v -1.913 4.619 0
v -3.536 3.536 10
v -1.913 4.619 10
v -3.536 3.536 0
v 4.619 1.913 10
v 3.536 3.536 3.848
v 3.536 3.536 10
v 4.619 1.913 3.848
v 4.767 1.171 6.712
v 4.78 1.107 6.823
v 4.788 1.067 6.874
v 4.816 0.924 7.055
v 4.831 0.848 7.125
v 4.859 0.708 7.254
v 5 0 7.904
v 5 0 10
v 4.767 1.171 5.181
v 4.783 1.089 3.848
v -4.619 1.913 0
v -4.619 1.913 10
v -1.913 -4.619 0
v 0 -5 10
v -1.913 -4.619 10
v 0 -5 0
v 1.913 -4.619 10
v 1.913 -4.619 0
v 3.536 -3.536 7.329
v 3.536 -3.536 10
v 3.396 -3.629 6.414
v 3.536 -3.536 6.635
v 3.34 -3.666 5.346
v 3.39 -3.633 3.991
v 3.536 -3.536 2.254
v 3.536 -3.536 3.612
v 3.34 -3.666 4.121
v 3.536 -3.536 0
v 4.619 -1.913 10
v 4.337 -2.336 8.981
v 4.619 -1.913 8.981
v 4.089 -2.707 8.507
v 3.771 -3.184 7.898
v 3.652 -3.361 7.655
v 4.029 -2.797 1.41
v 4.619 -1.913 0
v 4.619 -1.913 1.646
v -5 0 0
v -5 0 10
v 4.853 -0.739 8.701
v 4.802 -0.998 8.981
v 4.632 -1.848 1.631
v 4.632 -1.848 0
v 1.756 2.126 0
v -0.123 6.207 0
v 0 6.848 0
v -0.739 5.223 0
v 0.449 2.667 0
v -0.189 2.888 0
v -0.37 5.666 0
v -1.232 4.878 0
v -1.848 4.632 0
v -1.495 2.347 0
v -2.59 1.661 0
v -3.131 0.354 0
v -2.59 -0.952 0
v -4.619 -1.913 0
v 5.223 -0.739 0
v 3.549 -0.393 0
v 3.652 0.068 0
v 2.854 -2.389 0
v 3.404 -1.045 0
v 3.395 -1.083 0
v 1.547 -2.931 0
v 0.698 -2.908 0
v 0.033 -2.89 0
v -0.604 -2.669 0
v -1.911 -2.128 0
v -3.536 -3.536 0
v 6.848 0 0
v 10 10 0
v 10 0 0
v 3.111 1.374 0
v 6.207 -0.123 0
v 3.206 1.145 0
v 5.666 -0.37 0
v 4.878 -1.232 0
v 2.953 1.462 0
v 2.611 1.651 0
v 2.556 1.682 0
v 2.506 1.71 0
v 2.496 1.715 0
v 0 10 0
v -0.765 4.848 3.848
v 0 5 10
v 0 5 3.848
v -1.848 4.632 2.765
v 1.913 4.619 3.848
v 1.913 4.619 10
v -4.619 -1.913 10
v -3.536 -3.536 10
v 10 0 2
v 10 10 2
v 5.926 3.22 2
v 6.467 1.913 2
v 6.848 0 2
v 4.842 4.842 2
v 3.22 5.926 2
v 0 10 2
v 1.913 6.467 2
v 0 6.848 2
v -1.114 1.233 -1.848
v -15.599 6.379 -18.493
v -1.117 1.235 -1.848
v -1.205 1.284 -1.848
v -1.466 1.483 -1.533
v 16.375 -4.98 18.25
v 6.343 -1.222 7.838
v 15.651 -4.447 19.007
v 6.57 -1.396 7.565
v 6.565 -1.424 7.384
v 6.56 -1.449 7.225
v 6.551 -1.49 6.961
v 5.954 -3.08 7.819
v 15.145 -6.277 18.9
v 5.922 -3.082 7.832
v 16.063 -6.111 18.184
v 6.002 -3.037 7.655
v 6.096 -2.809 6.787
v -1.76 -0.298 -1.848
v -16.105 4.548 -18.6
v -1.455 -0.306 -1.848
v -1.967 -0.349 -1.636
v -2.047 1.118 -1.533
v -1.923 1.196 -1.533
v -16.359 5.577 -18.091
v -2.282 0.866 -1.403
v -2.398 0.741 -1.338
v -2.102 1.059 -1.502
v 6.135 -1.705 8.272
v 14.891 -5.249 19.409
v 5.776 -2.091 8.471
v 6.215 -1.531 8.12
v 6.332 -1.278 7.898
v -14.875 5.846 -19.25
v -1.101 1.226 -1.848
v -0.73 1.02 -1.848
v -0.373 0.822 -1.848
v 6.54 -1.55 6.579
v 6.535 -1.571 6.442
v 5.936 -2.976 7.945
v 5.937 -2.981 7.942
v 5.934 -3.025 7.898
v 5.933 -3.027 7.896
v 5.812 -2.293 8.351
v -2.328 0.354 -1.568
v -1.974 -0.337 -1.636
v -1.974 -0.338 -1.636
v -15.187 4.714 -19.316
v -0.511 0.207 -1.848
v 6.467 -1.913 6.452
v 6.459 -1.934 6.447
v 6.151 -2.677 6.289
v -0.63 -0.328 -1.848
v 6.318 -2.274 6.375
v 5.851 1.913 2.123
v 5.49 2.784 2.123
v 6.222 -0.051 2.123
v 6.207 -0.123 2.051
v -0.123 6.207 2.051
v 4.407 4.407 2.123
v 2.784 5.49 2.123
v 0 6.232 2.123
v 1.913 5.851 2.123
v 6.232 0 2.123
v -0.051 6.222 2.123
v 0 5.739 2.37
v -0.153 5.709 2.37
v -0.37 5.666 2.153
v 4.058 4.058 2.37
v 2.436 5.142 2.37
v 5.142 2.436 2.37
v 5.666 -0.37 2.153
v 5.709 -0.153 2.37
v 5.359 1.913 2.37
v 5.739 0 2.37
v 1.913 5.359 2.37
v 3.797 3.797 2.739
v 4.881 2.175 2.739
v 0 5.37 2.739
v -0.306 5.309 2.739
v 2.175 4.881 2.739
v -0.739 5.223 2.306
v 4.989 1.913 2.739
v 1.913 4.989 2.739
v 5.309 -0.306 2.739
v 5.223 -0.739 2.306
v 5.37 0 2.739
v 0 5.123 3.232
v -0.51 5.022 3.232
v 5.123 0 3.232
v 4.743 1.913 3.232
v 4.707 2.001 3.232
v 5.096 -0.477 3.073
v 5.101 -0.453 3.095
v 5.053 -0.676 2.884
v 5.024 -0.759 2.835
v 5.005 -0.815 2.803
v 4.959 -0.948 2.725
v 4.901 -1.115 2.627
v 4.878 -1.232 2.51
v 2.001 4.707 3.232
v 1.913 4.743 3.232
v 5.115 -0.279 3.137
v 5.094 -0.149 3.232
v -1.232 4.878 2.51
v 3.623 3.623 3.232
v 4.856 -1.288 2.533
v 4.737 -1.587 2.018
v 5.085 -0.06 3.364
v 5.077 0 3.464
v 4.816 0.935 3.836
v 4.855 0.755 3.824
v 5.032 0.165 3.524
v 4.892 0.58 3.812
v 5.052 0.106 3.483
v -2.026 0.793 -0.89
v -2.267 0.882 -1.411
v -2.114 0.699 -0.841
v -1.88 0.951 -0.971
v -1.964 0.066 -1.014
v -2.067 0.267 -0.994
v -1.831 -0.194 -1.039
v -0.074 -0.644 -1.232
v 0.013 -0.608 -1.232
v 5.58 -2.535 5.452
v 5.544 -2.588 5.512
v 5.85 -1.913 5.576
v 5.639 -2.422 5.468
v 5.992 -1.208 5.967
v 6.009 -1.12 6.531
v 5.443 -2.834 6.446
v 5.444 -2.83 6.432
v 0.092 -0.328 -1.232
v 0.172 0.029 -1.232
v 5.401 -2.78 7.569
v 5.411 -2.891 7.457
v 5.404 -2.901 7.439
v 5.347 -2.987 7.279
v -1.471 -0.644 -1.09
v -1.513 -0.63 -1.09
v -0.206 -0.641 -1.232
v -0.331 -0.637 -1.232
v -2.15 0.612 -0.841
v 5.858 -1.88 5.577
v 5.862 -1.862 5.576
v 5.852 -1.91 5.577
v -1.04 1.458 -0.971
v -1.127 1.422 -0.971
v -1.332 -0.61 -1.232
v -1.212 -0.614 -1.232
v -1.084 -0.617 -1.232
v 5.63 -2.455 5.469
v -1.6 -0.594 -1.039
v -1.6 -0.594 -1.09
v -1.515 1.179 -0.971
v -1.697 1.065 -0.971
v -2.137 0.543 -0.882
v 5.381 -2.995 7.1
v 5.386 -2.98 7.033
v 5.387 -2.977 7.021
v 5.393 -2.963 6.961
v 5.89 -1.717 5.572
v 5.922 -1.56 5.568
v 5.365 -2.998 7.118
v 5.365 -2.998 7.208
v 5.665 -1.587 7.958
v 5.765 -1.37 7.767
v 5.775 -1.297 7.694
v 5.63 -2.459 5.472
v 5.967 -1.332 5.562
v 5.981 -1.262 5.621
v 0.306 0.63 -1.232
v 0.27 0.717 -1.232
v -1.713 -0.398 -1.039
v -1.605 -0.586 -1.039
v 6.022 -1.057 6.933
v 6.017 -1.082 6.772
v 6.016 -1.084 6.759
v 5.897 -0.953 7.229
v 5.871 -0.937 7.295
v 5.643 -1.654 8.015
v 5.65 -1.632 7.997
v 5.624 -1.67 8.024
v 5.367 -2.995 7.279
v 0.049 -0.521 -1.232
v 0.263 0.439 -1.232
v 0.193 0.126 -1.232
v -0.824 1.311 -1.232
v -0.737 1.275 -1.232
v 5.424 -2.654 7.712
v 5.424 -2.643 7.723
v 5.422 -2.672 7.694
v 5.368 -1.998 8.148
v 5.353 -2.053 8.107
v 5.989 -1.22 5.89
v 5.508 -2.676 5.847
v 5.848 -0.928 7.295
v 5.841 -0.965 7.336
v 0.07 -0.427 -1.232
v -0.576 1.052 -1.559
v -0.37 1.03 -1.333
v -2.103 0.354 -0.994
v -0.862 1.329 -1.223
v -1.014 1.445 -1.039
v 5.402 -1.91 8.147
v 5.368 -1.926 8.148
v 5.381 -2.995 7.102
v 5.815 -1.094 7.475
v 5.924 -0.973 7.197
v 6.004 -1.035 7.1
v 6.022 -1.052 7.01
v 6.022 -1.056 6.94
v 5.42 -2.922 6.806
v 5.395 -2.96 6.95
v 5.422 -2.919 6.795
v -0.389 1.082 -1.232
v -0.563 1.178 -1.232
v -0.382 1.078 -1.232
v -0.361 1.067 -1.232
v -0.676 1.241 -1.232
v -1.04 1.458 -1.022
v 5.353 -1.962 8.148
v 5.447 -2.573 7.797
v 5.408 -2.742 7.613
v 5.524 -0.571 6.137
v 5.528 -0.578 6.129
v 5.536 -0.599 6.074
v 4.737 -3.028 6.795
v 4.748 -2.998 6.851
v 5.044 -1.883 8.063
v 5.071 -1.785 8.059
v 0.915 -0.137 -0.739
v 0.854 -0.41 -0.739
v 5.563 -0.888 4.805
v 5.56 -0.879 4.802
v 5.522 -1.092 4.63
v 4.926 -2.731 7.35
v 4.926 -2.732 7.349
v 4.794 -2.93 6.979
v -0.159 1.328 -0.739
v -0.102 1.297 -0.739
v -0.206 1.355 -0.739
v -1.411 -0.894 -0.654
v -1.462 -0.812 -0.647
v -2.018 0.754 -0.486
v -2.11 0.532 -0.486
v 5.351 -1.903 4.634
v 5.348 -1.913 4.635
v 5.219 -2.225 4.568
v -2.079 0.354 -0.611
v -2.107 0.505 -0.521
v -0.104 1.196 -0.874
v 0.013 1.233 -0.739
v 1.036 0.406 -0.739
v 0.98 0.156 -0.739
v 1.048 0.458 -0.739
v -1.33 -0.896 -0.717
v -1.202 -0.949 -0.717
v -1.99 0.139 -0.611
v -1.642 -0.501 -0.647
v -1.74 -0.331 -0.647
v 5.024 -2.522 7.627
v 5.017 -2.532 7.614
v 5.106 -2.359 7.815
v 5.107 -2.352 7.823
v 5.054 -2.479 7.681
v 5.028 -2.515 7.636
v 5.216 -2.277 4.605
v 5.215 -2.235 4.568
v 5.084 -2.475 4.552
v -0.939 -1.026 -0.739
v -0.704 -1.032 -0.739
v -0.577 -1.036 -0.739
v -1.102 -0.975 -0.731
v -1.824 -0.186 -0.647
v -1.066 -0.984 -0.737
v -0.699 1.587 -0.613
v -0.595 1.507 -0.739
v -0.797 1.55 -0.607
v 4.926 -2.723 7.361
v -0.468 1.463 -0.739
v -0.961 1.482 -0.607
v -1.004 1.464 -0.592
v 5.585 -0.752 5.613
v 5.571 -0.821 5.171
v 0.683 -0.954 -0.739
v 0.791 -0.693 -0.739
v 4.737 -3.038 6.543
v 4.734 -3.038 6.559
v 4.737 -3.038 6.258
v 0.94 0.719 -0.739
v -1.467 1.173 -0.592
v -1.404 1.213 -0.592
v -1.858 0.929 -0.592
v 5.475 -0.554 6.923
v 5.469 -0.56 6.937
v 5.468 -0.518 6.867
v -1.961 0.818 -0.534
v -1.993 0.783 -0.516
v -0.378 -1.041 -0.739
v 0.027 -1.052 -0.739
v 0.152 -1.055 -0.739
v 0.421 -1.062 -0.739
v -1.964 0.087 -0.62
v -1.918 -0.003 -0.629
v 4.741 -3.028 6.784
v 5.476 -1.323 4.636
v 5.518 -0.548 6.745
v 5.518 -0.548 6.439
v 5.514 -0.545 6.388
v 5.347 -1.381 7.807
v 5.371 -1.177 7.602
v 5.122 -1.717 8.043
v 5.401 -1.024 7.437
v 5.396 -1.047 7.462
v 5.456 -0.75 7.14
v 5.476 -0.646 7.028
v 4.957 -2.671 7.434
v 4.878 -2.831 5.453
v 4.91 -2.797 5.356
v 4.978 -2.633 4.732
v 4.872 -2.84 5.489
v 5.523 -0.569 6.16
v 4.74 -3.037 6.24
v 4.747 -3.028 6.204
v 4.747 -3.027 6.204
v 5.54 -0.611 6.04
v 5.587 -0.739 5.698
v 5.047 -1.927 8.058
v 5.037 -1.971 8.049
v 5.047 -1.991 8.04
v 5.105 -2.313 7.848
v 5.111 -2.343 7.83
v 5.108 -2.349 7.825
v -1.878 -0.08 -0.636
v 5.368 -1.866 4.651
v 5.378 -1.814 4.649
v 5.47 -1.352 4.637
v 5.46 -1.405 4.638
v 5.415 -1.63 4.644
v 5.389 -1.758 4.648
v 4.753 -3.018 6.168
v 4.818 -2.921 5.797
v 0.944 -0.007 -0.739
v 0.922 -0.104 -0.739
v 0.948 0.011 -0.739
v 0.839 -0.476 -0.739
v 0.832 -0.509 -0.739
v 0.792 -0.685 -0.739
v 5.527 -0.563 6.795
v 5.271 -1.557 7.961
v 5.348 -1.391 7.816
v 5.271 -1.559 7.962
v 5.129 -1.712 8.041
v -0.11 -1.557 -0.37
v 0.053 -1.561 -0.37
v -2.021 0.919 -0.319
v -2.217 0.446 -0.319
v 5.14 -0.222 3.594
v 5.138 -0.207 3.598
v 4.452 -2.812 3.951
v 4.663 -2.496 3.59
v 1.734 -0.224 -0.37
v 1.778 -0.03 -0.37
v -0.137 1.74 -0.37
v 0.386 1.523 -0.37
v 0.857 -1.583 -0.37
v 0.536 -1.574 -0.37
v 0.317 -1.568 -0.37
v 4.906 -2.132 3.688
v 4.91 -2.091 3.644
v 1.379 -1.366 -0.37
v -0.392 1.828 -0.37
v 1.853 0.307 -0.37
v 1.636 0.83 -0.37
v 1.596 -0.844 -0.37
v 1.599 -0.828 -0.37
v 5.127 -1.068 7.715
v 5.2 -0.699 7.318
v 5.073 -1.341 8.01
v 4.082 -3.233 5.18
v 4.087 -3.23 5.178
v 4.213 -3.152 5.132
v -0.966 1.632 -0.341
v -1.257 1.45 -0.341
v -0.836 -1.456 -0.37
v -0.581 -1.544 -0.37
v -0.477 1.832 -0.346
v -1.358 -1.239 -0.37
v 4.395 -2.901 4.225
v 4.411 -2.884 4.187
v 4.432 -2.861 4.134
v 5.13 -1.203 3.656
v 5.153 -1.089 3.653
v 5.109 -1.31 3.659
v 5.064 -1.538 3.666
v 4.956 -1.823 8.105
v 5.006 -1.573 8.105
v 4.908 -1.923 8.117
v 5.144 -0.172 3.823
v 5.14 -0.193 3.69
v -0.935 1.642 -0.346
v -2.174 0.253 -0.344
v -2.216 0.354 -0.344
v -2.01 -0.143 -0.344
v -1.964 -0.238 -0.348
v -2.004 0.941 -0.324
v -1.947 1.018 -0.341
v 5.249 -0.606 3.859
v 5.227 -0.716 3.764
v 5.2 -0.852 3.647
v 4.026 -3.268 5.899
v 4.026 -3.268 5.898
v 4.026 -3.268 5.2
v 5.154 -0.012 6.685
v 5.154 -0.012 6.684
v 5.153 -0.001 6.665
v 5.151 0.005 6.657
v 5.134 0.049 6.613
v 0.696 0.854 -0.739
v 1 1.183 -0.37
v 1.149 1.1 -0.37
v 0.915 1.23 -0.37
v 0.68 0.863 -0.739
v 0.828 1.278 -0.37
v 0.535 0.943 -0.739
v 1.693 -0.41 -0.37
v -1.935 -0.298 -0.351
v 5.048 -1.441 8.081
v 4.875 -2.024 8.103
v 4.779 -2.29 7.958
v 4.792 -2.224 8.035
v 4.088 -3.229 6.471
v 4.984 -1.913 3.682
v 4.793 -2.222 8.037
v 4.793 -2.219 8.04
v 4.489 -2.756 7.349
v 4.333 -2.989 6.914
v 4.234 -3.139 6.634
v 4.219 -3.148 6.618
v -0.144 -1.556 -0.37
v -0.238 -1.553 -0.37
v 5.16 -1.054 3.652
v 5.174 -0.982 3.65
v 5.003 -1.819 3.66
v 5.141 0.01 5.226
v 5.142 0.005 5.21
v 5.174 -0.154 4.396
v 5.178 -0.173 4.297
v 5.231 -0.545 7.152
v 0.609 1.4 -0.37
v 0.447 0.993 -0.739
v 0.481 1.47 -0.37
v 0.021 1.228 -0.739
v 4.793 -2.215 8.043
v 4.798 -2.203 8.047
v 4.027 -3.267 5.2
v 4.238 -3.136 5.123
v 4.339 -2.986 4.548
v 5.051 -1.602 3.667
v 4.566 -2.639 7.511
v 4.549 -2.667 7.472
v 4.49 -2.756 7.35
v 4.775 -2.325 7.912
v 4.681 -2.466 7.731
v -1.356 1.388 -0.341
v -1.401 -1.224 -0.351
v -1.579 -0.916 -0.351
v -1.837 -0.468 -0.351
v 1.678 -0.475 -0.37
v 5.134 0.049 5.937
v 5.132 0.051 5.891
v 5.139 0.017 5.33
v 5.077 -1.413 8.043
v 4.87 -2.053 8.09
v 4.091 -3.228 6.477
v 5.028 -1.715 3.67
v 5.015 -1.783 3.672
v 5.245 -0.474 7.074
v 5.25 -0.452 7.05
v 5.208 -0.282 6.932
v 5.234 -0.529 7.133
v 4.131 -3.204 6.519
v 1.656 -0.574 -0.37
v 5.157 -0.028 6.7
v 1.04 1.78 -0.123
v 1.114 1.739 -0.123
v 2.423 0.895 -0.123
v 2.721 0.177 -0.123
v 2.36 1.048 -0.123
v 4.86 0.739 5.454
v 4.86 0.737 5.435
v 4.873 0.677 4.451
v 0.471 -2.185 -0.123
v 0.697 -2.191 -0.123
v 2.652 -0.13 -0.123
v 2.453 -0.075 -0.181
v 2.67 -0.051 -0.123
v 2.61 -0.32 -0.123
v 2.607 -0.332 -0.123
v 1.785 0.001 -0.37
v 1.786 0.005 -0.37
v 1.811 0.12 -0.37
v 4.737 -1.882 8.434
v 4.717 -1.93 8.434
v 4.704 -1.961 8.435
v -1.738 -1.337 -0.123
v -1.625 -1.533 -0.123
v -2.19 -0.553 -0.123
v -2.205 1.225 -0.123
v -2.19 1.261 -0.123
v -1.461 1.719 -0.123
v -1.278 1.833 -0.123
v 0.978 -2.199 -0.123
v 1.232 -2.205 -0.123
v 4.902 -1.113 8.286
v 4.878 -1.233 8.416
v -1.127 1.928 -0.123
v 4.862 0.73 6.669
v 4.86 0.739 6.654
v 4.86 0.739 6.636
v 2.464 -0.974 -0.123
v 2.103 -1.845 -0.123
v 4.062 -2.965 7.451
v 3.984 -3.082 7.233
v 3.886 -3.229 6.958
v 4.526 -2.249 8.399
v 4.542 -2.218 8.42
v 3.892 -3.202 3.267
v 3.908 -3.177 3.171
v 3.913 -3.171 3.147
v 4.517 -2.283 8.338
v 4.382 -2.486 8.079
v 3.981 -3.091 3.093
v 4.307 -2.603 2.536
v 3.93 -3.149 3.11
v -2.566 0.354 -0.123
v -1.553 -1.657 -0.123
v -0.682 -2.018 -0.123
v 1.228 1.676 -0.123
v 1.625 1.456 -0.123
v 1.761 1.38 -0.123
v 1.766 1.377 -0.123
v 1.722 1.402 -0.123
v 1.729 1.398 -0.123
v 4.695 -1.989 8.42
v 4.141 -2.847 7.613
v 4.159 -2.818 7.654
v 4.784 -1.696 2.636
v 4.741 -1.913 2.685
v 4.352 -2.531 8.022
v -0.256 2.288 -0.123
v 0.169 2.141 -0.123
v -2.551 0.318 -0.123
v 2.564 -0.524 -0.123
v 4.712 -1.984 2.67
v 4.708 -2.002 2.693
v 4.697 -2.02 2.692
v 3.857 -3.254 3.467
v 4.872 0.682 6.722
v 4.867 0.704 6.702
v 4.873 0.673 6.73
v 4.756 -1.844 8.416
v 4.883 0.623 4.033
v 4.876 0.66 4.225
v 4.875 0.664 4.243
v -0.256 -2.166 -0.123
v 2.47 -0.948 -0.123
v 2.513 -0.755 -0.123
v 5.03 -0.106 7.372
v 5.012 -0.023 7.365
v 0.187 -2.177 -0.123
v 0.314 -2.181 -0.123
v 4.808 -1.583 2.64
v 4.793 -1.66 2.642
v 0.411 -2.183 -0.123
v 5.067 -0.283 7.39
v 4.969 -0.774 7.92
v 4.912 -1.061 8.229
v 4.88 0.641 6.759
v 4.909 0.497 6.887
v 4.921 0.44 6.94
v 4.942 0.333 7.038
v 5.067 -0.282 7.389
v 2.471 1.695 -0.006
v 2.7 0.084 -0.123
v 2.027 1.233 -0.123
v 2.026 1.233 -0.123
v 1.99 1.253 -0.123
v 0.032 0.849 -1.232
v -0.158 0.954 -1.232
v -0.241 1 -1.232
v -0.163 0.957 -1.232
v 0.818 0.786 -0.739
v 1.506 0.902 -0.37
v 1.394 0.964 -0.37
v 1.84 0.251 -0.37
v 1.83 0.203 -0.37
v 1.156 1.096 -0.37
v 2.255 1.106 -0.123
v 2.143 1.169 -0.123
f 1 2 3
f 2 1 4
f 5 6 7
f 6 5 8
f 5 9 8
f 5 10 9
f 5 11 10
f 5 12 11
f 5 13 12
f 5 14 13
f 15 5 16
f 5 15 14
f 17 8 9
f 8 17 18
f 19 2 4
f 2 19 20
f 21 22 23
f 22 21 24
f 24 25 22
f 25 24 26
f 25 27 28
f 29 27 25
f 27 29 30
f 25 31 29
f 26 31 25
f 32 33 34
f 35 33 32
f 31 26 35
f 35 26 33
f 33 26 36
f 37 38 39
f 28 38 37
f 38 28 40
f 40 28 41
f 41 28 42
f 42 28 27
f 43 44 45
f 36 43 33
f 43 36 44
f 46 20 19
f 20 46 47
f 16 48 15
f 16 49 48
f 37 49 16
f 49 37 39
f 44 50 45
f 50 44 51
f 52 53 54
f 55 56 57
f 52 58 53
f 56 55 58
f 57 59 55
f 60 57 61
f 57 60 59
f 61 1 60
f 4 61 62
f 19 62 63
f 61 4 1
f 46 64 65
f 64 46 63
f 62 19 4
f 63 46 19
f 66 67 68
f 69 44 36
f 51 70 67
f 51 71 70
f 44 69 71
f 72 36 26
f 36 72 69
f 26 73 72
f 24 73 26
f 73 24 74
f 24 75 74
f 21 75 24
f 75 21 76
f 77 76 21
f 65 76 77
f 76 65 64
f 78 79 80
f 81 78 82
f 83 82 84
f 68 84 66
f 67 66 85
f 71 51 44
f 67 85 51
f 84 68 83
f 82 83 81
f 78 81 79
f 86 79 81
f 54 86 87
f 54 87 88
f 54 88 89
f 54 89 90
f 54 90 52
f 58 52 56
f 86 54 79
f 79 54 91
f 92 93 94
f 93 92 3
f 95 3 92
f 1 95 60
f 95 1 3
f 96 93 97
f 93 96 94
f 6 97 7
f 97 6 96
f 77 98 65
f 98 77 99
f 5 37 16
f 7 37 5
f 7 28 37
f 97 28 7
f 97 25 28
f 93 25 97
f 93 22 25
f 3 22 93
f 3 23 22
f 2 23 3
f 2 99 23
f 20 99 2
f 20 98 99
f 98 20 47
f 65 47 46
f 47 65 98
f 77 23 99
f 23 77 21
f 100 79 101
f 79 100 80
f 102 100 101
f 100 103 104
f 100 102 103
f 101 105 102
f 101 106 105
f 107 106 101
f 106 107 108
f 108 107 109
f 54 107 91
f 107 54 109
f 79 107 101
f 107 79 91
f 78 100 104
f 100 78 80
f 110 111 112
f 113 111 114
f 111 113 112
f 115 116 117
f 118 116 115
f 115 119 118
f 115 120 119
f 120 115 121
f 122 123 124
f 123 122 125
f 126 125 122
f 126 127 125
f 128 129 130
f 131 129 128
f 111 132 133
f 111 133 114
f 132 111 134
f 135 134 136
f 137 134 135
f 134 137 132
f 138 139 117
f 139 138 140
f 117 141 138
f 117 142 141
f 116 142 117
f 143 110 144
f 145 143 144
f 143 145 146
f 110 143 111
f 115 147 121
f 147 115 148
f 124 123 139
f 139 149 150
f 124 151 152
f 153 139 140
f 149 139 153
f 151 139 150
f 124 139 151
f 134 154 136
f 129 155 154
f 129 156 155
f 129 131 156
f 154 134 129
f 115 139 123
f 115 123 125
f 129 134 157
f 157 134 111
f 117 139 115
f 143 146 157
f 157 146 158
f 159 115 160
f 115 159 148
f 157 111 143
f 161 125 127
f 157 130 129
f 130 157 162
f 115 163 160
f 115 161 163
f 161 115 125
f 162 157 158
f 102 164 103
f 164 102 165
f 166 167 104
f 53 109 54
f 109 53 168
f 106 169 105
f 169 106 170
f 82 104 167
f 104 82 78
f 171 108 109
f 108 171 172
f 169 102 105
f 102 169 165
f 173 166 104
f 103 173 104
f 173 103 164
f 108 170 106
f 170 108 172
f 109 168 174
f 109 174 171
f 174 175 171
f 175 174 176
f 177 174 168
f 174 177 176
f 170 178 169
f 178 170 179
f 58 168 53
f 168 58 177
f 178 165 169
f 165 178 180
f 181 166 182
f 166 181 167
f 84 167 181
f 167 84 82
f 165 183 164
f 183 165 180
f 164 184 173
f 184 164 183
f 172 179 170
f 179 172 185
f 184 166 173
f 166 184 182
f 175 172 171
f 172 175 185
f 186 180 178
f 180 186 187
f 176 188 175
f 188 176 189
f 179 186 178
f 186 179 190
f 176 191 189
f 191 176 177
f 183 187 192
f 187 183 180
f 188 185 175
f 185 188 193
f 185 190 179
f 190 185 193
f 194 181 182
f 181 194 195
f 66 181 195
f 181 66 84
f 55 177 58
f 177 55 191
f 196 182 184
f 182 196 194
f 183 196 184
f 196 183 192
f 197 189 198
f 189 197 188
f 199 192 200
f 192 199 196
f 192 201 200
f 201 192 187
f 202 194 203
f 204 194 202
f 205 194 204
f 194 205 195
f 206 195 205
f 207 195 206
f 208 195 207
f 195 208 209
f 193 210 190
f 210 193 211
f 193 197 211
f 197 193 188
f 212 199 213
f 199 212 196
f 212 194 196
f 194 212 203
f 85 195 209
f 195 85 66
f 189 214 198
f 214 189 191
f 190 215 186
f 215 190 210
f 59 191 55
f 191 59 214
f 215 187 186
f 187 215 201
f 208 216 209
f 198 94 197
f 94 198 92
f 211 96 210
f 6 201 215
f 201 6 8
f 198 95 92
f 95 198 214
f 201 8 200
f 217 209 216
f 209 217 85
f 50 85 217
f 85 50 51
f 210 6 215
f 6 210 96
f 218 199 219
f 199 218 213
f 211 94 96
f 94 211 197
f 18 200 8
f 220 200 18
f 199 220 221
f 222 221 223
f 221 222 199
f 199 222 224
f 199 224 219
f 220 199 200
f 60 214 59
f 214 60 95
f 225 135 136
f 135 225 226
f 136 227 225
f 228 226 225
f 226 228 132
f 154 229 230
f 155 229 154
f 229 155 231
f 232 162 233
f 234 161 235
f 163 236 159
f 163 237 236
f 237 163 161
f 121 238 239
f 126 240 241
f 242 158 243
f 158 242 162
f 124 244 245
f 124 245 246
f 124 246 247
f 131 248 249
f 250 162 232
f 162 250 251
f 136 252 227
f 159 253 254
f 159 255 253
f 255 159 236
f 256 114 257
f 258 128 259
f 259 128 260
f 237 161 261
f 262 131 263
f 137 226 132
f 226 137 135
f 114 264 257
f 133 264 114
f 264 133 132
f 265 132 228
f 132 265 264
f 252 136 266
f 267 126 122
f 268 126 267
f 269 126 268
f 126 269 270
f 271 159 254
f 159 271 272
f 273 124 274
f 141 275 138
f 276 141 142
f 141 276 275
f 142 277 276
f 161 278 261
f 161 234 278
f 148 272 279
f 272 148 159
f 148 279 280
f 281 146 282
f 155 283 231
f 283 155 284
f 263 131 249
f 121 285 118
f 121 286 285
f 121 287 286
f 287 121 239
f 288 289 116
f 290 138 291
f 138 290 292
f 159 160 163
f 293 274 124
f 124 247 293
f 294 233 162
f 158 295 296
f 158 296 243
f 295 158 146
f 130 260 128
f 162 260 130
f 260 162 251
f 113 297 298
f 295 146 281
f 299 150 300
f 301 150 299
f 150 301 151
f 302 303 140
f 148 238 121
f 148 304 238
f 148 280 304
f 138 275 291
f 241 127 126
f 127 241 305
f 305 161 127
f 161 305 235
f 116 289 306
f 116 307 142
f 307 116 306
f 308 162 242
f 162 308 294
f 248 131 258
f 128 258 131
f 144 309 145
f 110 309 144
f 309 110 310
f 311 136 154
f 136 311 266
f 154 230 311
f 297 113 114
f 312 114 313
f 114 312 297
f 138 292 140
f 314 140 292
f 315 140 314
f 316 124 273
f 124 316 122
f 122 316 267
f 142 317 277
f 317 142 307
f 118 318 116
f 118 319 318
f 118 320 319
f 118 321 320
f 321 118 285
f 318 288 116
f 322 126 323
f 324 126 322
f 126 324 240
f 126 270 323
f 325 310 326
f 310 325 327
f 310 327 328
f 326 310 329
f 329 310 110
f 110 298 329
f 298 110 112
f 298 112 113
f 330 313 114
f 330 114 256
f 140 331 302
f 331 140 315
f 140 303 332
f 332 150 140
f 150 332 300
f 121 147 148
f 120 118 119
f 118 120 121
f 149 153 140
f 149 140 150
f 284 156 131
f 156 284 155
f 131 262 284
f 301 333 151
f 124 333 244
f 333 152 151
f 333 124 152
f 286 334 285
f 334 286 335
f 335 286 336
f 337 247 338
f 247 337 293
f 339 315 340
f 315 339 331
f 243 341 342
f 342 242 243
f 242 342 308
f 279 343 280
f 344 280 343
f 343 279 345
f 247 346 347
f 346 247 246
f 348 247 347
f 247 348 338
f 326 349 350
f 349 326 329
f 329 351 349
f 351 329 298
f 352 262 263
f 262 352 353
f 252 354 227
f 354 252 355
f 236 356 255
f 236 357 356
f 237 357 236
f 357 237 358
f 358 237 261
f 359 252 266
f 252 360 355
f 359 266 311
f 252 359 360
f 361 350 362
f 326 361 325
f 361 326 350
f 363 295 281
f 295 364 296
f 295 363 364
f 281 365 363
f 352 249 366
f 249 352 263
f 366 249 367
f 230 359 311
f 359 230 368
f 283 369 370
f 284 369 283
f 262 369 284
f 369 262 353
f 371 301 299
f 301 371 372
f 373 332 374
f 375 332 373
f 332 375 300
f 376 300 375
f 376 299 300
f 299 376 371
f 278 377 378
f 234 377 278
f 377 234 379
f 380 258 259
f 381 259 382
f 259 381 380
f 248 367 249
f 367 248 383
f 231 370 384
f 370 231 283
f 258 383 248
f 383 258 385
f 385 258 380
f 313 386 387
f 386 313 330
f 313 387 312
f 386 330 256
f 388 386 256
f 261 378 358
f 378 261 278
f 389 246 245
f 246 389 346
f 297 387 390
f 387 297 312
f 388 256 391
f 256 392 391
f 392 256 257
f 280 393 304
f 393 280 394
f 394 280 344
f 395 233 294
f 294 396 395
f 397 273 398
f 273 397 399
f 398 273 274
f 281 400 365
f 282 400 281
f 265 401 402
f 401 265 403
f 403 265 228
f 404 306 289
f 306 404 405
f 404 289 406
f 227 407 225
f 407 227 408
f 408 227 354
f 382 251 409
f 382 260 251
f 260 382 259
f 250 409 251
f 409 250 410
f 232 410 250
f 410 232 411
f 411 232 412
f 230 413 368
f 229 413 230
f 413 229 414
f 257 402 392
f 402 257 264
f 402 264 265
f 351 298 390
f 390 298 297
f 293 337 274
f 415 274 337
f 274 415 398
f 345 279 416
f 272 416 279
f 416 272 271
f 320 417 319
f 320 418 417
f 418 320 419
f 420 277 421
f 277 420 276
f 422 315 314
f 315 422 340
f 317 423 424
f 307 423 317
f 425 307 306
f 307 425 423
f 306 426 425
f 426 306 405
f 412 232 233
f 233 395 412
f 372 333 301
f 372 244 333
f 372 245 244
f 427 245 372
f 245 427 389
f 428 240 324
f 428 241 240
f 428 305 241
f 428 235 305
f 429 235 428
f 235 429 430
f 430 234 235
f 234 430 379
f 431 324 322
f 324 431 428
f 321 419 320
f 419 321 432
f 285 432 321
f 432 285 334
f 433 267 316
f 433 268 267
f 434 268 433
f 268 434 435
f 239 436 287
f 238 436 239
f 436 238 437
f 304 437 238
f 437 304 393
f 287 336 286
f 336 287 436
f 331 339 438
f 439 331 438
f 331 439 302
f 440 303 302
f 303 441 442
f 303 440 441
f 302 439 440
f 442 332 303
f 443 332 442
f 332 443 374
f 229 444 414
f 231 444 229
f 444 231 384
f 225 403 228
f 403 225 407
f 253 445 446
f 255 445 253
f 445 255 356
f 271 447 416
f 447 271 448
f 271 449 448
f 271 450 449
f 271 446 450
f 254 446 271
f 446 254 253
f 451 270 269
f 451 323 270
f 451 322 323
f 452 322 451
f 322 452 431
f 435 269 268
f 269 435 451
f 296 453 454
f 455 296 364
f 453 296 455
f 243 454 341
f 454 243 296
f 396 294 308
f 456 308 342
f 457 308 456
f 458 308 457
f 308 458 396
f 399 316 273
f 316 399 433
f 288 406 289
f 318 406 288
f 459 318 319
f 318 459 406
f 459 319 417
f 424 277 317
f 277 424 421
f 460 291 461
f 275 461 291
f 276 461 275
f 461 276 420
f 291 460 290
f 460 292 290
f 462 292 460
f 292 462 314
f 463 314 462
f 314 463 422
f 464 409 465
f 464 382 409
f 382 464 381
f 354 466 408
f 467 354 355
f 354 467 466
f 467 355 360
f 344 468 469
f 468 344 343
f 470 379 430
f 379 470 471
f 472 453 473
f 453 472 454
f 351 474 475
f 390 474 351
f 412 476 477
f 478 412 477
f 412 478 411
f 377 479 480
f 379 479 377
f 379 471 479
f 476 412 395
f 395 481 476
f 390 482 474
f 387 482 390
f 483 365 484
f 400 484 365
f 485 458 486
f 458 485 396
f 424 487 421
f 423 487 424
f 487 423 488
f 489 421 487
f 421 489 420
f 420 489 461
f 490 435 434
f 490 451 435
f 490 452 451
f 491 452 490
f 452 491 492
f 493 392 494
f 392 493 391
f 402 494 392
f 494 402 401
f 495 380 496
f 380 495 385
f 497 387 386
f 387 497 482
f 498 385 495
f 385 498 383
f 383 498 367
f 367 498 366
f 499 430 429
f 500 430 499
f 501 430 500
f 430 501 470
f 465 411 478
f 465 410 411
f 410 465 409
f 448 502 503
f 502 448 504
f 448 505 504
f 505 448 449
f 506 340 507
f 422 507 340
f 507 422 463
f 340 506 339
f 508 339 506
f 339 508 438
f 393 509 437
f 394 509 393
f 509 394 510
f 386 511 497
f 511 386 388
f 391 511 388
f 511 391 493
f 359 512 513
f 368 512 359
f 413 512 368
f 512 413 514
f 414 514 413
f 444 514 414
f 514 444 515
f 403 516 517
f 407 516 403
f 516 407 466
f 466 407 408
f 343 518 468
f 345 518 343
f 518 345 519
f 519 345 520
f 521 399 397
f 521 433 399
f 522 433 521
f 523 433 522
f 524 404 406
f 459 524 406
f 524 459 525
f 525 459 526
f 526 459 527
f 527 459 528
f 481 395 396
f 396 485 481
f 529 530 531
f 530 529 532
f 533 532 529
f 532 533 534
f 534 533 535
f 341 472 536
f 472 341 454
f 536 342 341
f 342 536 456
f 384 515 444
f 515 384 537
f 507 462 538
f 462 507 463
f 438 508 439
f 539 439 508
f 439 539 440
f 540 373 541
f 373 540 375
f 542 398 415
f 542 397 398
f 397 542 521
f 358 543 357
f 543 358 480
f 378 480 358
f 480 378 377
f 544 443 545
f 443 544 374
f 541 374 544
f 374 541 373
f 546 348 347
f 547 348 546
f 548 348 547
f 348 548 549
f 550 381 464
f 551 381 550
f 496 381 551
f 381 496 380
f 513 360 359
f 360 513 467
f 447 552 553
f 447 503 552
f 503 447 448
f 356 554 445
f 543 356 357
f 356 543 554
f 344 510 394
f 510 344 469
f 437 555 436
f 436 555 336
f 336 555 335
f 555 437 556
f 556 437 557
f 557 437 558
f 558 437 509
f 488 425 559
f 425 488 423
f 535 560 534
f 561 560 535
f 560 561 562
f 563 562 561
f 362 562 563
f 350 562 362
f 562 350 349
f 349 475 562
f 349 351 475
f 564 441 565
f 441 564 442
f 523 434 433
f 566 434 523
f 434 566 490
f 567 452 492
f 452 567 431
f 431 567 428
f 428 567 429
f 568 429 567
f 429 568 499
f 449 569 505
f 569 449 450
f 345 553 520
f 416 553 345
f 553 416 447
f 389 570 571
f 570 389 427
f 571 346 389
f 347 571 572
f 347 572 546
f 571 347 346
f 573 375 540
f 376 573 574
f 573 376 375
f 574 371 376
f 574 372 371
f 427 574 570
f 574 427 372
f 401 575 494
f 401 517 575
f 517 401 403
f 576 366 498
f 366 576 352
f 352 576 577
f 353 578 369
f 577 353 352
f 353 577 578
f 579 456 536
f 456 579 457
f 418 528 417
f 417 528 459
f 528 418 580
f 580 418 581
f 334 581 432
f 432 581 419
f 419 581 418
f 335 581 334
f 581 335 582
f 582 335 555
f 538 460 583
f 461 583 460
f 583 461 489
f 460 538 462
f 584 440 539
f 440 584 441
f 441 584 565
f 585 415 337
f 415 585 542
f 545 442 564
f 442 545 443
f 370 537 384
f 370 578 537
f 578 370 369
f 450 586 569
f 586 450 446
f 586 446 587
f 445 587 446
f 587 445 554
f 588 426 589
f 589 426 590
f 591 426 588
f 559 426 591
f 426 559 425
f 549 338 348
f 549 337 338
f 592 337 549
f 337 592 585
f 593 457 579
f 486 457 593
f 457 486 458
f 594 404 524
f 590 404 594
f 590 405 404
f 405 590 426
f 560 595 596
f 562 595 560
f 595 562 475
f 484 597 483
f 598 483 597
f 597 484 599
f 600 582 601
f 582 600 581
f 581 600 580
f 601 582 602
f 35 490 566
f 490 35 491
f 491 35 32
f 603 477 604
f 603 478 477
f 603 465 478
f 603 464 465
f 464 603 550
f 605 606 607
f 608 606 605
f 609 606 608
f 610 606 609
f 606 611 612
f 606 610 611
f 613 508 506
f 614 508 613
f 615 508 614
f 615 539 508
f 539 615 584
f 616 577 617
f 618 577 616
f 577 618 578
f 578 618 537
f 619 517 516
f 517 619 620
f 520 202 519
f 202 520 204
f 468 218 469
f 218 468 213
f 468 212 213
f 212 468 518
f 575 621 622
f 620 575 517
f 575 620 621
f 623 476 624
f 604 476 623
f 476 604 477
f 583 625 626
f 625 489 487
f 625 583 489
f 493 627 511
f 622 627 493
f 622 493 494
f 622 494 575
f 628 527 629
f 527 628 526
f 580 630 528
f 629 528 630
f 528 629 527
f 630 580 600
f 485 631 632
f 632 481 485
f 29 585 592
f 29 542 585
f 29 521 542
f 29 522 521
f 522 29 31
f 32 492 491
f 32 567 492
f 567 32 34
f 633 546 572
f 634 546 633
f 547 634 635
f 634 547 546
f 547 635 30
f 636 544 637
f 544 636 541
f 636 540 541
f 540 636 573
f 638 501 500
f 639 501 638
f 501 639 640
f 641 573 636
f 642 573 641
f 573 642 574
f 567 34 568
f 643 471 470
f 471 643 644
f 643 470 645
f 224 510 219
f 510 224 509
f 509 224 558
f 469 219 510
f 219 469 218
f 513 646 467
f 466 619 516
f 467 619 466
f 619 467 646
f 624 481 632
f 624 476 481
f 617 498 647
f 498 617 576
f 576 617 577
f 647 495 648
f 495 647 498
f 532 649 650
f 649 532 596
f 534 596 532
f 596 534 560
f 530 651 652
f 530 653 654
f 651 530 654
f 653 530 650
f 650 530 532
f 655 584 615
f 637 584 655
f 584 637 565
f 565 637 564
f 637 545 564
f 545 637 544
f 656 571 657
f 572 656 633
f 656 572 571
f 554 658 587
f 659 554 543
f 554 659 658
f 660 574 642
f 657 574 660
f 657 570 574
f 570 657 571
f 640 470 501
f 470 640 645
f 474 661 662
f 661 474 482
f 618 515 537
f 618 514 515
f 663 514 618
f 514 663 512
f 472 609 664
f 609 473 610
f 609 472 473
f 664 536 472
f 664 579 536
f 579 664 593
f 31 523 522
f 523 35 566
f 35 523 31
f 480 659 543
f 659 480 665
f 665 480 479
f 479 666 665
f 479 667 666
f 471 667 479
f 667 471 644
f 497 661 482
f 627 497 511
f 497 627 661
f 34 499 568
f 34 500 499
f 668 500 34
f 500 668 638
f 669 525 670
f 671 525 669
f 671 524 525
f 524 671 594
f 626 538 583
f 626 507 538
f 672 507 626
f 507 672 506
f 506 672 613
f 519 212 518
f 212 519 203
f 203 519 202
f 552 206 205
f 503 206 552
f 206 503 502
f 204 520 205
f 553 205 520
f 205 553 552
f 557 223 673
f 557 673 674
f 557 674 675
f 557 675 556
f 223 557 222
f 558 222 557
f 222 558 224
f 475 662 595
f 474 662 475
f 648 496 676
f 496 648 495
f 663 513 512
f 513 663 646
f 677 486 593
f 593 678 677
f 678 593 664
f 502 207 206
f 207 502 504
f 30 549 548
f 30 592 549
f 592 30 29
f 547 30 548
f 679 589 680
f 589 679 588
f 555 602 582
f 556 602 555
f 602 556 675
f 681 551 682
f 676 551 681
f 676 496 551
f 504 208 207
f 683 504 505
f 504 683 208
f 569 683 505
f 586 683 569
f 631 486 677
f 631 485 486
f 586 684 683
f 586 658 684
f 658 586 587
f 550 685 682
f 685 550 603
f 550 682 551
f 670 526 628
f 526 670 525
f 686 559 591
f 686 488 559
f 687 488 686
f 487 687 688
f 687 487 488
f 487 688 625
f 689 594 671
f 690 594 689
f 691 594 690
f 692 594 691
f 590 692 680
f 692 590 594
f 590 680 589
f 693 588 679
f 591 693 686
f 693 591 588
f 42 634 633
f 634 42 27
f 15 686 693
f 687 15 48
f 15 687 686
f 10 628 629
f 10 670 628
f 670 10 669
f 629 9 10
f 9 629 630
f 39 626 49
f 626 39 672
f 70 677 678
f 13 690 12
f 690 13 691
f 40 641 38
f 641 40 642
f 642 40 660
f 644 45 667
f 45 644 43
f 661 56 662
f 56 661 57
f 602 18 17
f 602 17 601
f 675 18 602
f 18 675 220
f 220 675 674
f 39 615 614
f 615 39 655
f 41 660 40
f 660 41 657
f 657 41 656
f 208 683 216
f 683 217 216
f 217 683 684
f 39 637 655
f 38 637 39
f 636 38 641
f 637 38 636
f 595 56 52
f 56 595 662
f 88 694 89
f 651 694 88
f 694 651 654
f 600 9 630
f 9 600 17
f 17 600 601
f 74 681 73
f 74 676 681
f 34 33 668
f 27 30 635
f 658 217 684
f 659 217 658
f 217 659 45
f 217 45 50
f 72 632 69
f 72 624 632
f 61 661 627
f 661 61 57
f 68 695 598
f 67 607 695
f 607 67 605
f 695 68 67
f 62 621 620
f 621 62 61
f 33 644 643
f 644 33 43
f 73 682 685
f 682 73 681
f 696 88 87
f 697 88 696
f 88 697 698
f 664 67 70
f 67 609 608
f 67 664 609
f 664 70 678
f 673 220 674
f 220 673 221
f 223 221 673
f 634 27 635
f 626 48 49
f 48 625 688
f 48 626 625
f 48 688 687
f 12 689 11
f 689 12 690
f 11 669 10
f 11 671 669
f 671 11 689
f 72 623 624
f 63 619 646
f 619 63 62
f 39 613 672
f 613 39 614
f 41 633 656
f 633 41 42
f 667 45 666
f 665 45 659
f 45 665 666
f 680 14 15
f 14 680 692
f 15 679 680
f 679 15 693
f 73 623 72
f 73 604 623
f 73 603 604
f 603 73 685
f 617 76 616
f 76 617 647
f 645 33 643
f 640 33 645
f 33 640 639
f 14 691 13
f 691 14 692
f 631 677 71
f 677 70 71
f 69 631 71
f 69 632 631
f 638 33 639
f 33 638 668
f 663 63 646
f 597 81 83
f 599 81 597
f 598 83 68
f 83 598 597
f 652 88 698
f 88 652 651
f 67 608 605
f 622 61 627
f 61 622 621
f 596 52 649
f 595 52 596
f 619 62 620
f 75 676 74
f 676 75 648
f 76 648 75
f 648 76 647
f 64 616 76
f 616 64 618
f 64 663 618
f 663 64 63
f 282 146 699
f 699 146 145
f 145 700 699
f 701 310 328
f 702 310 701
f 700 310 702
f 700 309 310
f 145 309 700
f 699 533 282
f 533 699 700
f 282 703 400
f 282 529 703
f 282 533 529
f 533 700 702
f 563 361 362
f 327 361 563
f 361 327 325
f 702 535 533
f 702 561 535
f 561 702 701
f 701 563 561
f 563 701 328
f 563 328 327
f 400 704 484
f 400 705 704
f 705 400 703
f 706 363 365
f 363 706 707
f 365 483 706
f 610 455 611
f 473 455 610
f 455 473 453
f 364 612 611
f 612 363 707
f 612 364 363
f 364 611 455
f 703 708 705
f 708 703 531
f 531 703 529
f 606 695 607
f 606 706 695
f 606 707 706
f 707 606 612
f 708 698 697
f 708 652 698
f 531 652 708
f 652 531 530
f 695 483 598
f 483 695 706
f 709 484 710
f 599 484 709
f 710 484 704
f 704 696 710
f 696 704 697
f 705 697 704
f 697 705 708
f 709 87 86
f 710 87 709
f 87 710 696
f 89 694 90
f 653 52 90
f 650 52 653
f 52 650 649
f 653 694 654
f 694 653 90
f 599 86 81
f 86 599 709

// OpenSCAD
// file: util.scad
function ngon(num, r) = [for (i = [0:num - 1],
                              a = i * 360 / num)[r * cos(a), r *sin(a)]];

function matrix(x, y, dx,
                dy) = [for (i = [0:x - 1], j = [0:y - 1])[dx * i, dy *j]];

function tight_pack(x, y, d) = [for (
    i = [0:2 * x / 3 - 1],
    j = [0:2 * y - 1])[2 * d * sin(60) * (i + (j % 2) / 2), d *j *cos(60)]];

module hex_grid(box, d, t) {
  total = d + t;
  x = box[0] / total + 1;
  y = box[1] / total + 1;
  z = box[2];
  r = d / 2;
  adjusted =
      r *
      (2 -
       sqrt(3) / 2); // ratio of side distance to corner distance of a hexagon
  for (p = tight_pack(x, y, total))
    translate(p - [ x * total / 2, y * total / 2, 0 ])
        cylinder(z, adjusted, adjusted, $fn = 6);
}

module trapazoid_prism(bottom_width, bottom_length, top_width, top_length,
                       height, center = false) {
  CubeFaces = [
    [ 0, 1, 2, 3 ], // bottom
    [ 4, 5, 1, 0 ], // front
    [ 7, 6, 5, 4 ], // top
    [ 5, 6, 2, 1 ], // right
    [ 6, 7, 3, 2 ], // back
    [ 7, 4, 0, 3 ]
  ]; // left

  if (center) {
    CubePoints = [
      [ -bottom_width / 2, -bottom_length / 2, -height / 2 ],
      [ -bottom_width / 2, bottom_length / 2, -height / 2 ],
      [ bottom_width / 2, bottom_length / 2, -height / 2 ],
      [ bottom_width / 2, -bottom_length / 2, -height / 2 ],

      [ -top_width / 2, -top_length / 2, height / 2 ],
      [ -top_width / 2, top_length / 2, height / 2 ],
      [ top_width / 2, top_length / 2, height / 2 ],
      [ top_width / 2, -top_length / 2, height / 2 ]
    ];
    polyhedron(CubePoints, CubeFaces);
  } else {
    CubePoints = [
      [ 0, 0, 0 ],                        // 0
      [ bottom_width, 0, 0 ],             // 1
      [ bottom_width, bottom_length, 0 ], // 2
      [ 0, bottom_length, 0 ],            // 3

      [ 0, 0, height ],                  // 0
      [ top_width, 0, height ],          // 1
      [ top_width, top_length, height ], // 2
      [ 0, top_length, height ]
    ];
    polyhedron(CubePoints, CubeFaces);
  }
}

//fillet functions from
//https://github.com/clothbot/ClothBotCreations/blob/master/utilities/fillet.scad
module fillet(r=1.0,steps=3,include=true) {
  if(include) for (k=[0:$children-1]) {
	children(k);
  }
  for (i=[0:$children-2] ) {
    for(j=[i+1:$children-1] ) {
	fillet_two(r=r,steps=steps) {
	  children(i);
	  children(j);
	  intersection() {
		children(i);
		children(j);
	  }
	}
    }
  }
}

module fillet_two(r=1.0,steps=3) {
  for(step=[1:steps]) {
	hull() {
	  render() intersection() {
		children(0);
		offset_3d(r=r*step/steps) children(2);
	  }
	  render() intersection() {
		children(1);
		offset_3d(r=r*(steps-step+1)/steps) children(2);
	  }
	}
  }
}

module offset_3d(r=1.0) {
  for(k=[0:$children-1]) minkowski() {
	children(k);
	sphere(r=r,$fn=8);
  }
}
// main file
use<util.scad>;

fillet(r=2,steps=5) {
	cylinder(r=5,h=10);
	cube([10,10,2]);
	rotate([30,30,30]) cylinder(r=1.0,h=50,center=true);
}
